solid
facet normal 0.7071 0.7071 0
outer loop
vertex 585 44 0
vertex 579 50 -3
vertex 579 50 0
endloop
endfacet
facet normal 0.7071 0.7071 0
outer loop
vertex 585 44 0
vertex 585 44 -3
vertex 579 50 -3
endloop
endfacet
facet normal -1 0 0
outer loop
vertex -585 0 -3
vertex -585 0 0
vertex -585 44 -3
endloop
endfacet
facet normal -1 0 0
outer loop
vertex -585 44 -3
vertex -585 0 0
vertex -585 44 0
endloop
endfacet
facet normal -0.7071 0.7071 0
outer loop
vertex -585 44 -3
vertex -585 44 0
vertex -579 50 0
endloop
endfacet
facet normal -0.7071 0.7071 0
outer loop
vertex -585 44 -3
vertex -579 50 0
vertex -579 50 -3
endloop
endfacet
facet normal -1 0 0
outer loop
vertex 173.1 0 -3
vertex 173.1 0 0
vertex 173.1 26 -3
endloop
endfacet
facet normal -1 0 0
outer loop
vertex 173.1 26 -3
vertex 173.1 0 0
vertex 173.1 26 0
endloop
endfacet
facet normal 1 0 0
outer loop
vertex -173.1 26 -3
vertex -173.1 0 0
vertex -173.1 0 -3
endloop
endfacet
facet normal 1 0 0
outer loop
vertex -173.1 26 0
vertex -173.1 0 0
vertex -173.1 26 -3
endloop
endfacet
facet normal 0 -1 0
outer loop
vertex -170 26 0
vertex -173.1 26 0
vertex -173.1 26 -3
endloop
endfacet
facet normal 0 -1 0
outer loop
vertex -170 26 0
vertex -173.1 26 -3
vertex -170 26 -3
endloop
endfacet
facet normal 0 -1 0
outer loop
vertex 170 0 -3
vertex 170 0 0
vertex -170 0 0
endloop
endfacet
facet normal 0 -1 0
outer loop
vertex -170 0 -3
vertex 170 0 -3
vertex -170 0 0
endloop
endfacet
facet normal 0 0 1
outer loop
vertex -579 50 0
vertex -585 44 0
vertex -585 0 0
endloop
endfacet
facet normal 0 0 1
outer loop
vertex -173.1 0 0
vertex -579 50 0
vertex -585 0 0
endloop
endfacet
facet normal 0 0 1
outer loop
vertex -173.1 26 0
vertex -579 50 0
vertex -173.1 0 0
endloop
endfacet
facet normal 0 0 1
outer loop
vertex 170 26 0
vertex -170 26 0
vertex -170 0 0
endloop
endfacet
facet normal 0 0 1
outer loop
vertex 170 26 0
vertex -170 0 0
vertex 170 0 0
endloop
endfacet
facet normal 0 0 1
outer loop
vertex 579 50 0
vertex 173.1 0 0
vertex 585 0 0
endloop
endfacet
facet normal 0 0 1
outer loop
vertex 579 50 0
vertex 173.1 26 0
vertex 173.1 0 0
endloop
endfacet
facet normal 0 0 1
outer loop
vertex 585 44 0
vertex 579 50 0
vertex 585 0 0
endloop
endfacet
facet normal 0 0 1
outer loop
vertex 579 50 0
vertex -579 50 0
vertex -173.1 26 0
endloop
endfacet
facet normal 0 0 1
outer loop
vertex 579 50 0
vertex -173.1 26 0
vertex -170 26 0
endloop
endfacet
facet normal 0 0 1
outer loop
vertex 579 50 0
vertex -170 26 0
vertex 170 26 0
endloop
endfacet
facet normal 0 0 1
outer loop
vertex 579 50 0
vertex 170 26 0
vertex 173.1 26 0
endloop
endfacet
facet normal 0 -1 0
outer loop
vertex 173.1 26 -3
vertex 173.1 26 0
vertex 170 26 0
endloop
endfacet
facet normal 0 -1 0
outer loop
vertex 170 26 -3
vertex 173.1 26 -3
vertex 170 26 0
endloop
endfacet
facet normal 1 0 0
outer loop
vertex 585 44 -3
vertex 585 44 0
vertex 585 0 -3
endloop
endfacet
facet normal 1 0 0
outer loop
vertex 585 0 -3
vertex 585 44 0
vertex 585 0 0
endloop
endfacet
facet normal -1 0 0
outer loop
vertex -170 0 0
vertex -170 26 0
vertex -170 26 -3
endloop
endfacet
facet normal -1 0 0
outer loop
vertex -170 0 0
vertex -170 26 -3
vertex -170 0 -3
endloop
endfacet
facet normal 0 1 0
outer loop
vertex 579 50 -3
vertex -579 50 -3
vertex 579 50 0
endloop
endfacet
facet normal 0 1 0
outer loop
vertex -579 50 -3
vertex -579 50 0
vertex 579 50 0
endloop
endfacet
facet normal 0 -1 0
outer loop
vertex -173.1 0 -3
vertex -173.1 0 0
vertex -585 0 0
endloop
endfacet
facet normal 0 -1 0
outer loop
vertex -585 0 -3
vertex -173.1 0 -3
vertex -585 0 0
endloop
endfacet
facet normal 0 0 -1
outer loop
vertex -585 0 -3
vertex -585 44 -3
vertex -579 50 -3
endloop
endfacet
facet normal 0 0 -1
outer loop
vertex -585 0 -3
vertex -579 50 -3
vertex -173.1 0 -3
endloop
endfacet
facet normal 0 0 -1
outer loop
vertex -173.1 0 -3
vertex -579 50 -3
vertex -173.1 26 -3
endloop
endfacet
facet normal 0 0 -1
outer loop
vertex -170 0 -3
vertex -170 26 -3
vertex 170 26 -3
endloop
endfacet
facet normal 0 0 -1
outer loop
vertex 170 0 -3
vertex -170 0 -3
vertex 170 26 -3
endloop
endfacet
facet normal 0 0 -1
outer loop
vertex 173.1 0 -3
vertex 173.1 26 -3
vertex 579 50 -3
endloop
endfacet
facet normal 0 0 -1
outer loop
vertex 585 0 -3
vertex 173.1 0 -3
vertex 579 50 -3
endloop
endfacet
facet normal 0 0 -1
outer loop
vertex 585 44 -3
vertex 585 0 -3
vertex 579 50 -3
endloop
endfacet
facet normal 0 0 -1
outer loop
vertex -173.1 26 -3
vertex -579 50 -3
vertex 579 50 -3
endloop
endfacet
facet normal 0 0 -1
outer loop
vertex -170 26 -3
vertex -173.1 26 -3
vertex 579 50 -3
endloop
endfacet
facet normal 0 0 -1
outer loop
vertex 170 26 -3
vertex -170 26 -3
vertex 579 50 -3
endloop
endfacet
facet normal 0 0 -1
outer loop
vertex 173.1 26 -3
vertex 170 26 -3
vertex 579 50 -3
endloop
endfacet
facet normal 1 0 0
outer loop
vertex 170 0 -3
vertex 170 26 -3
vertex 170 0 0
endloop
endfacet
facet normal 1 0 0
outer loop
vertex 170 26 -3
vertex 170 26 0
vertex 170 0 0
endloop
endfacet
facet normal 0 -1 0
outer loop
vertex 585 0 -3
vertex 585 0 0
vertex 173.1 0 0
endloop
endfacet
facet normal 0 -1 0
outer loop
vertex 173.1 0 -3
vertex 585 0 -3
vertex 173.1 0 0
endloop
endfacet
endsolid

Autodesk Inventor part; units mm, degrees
ref_plane "YZ Plane" through (0, 0, 0) normal (1, 0, 0) x (0, 1, 0)
ref_plane "XZ Plane" through (0, 0, 0) normal (0, 1, 0) x (-1, 0, 0)
ref_plane "XY Plane" through (0, 0, 0) normal (0, 0, 1) x (1, 0, 0)
sketch "Sketch1" plane through (0, 0, 0) normal (0, 0, 1) x (1, 0, 0)
  line L0 (-585, 50) -> (585, 50)
  line L1 (585, 50) -> (585, 0)
  line L2 (585, 0) -> (-585, 0)
  line L3 (-585, 0) -> (-585, 50)
  circle A0 centre (-585, 0) radius 25
  circle A1 centre (585, 0) radius 25
  line L4 (585, 0) -> (642.2042, 48)
  line L5 (642.2042, 48) -> (642.2042, 50)
  line L6 (642.2042, 50) -> (585, 50)
  point P0 (0, 0)
  point P1 (0, 0)
  point P2 (-585, 25)
  point P3 (-560, 0)
  point P4 (560, 0)
  point P5 (585, 25)
  point P6 (604.1511, 16.0697)
  dimension "d16" = 50
  dimension "d17" = 1170
  dimension "d18" = 50
  dimension "d19" = 50
  dimension "d32" = 2
  dimension "d33" = 50
extrude "Plate2" add sketch "Sketch1" against normal blind 3 contours L0 L1 A1 L2 A0 L3 | A0 L2 L3 | L1 L2 A1 picked at (-583.1457, 16.4577)
sketch "Sketch2" plane through (0, 0, 0) normal (0, 0, 1) x (1, 0, 0)
  line L0 (-585, 0) -> (585, 0) projected
  line L1 (585, 50) -> (-585, 50) projected
  line L2 (-171.55, 26) -> (-171.55, 202.9149) construction
  line L3 (-173.1, 26) -> (-170, 26)
  line L4 (-170, 26) -> (-170, 0)
  line L5 (-170, 0) -> (-173.1, 0)
  line L6 (-173.1, 0) -> (-173.1, 26)
  line L7 (171.55, 26) -> (171.55, 202.9149) construction
  line L8 (170, 0) -> (173.1, 0)
  line L9 (173.1, 0) -> (173.1, 26)
  line L10 (173.1, 26) -> (170, 26)
  line L11 (170, 26) -> (170, 0)
  line L12 (0, 236.7146) -> (0, 0) construction
  point P0 (0, 0)
  point P1 (170, 0)
  point P2 (173.1, 0)
  point P3 (-173.1, 0)
  point P4 (-170, 0)
  dimension "d39" = 26
  dimension "d41" = 3.1
  dimension "d43" = 340
extrude "Extrusion1" cut sketch "Sketch2" against normal through all
sketch "Sketch4" plane through (0, 0, 0) normal (0, 0, 1) x (1, 0, 0)
  line L0 (-62.2268, 17.4688) -> (-62.2268, 36.055) construction
  line L1 (-62.2268, 36.055) -> (76.1261, 36.055) construction
  line L2 (76.1261, 36.055) -> (76.1261, 17.4688) construction
  line L3 (76.1261, 17.4688) -> (-62.2268, 17.4688) construction
  point P0 (0, 0)
mark "Mark1"
chamfer "Corner Chamfer1" distance 6 angle 45 2 edges at (585, 50, -1.5) (-585, 50, -1.5)
equation "\"d20\" = Thickness"
equation "\"BendReliefWidth\" = Thickness"
equation "\"BendReliefDepth\" = 0.5 * Thickness"
equation "\"CornerReliefSize\" = 4 * Thickness"
equation "\"MinimumRemnant\" = 2 * Thickness"
equation "\"TransitionRadius\" = BendRadius"
equation "\"JacobiRadiusSize\" = BendRadius"
equation "\"GapSize\" = Thickness"
equation "\"Thickness\" = 3"
equation "\"BendRadius\" = 5"
properties part number "MSC 108 RIB CONE" material "Stainless Steel"
